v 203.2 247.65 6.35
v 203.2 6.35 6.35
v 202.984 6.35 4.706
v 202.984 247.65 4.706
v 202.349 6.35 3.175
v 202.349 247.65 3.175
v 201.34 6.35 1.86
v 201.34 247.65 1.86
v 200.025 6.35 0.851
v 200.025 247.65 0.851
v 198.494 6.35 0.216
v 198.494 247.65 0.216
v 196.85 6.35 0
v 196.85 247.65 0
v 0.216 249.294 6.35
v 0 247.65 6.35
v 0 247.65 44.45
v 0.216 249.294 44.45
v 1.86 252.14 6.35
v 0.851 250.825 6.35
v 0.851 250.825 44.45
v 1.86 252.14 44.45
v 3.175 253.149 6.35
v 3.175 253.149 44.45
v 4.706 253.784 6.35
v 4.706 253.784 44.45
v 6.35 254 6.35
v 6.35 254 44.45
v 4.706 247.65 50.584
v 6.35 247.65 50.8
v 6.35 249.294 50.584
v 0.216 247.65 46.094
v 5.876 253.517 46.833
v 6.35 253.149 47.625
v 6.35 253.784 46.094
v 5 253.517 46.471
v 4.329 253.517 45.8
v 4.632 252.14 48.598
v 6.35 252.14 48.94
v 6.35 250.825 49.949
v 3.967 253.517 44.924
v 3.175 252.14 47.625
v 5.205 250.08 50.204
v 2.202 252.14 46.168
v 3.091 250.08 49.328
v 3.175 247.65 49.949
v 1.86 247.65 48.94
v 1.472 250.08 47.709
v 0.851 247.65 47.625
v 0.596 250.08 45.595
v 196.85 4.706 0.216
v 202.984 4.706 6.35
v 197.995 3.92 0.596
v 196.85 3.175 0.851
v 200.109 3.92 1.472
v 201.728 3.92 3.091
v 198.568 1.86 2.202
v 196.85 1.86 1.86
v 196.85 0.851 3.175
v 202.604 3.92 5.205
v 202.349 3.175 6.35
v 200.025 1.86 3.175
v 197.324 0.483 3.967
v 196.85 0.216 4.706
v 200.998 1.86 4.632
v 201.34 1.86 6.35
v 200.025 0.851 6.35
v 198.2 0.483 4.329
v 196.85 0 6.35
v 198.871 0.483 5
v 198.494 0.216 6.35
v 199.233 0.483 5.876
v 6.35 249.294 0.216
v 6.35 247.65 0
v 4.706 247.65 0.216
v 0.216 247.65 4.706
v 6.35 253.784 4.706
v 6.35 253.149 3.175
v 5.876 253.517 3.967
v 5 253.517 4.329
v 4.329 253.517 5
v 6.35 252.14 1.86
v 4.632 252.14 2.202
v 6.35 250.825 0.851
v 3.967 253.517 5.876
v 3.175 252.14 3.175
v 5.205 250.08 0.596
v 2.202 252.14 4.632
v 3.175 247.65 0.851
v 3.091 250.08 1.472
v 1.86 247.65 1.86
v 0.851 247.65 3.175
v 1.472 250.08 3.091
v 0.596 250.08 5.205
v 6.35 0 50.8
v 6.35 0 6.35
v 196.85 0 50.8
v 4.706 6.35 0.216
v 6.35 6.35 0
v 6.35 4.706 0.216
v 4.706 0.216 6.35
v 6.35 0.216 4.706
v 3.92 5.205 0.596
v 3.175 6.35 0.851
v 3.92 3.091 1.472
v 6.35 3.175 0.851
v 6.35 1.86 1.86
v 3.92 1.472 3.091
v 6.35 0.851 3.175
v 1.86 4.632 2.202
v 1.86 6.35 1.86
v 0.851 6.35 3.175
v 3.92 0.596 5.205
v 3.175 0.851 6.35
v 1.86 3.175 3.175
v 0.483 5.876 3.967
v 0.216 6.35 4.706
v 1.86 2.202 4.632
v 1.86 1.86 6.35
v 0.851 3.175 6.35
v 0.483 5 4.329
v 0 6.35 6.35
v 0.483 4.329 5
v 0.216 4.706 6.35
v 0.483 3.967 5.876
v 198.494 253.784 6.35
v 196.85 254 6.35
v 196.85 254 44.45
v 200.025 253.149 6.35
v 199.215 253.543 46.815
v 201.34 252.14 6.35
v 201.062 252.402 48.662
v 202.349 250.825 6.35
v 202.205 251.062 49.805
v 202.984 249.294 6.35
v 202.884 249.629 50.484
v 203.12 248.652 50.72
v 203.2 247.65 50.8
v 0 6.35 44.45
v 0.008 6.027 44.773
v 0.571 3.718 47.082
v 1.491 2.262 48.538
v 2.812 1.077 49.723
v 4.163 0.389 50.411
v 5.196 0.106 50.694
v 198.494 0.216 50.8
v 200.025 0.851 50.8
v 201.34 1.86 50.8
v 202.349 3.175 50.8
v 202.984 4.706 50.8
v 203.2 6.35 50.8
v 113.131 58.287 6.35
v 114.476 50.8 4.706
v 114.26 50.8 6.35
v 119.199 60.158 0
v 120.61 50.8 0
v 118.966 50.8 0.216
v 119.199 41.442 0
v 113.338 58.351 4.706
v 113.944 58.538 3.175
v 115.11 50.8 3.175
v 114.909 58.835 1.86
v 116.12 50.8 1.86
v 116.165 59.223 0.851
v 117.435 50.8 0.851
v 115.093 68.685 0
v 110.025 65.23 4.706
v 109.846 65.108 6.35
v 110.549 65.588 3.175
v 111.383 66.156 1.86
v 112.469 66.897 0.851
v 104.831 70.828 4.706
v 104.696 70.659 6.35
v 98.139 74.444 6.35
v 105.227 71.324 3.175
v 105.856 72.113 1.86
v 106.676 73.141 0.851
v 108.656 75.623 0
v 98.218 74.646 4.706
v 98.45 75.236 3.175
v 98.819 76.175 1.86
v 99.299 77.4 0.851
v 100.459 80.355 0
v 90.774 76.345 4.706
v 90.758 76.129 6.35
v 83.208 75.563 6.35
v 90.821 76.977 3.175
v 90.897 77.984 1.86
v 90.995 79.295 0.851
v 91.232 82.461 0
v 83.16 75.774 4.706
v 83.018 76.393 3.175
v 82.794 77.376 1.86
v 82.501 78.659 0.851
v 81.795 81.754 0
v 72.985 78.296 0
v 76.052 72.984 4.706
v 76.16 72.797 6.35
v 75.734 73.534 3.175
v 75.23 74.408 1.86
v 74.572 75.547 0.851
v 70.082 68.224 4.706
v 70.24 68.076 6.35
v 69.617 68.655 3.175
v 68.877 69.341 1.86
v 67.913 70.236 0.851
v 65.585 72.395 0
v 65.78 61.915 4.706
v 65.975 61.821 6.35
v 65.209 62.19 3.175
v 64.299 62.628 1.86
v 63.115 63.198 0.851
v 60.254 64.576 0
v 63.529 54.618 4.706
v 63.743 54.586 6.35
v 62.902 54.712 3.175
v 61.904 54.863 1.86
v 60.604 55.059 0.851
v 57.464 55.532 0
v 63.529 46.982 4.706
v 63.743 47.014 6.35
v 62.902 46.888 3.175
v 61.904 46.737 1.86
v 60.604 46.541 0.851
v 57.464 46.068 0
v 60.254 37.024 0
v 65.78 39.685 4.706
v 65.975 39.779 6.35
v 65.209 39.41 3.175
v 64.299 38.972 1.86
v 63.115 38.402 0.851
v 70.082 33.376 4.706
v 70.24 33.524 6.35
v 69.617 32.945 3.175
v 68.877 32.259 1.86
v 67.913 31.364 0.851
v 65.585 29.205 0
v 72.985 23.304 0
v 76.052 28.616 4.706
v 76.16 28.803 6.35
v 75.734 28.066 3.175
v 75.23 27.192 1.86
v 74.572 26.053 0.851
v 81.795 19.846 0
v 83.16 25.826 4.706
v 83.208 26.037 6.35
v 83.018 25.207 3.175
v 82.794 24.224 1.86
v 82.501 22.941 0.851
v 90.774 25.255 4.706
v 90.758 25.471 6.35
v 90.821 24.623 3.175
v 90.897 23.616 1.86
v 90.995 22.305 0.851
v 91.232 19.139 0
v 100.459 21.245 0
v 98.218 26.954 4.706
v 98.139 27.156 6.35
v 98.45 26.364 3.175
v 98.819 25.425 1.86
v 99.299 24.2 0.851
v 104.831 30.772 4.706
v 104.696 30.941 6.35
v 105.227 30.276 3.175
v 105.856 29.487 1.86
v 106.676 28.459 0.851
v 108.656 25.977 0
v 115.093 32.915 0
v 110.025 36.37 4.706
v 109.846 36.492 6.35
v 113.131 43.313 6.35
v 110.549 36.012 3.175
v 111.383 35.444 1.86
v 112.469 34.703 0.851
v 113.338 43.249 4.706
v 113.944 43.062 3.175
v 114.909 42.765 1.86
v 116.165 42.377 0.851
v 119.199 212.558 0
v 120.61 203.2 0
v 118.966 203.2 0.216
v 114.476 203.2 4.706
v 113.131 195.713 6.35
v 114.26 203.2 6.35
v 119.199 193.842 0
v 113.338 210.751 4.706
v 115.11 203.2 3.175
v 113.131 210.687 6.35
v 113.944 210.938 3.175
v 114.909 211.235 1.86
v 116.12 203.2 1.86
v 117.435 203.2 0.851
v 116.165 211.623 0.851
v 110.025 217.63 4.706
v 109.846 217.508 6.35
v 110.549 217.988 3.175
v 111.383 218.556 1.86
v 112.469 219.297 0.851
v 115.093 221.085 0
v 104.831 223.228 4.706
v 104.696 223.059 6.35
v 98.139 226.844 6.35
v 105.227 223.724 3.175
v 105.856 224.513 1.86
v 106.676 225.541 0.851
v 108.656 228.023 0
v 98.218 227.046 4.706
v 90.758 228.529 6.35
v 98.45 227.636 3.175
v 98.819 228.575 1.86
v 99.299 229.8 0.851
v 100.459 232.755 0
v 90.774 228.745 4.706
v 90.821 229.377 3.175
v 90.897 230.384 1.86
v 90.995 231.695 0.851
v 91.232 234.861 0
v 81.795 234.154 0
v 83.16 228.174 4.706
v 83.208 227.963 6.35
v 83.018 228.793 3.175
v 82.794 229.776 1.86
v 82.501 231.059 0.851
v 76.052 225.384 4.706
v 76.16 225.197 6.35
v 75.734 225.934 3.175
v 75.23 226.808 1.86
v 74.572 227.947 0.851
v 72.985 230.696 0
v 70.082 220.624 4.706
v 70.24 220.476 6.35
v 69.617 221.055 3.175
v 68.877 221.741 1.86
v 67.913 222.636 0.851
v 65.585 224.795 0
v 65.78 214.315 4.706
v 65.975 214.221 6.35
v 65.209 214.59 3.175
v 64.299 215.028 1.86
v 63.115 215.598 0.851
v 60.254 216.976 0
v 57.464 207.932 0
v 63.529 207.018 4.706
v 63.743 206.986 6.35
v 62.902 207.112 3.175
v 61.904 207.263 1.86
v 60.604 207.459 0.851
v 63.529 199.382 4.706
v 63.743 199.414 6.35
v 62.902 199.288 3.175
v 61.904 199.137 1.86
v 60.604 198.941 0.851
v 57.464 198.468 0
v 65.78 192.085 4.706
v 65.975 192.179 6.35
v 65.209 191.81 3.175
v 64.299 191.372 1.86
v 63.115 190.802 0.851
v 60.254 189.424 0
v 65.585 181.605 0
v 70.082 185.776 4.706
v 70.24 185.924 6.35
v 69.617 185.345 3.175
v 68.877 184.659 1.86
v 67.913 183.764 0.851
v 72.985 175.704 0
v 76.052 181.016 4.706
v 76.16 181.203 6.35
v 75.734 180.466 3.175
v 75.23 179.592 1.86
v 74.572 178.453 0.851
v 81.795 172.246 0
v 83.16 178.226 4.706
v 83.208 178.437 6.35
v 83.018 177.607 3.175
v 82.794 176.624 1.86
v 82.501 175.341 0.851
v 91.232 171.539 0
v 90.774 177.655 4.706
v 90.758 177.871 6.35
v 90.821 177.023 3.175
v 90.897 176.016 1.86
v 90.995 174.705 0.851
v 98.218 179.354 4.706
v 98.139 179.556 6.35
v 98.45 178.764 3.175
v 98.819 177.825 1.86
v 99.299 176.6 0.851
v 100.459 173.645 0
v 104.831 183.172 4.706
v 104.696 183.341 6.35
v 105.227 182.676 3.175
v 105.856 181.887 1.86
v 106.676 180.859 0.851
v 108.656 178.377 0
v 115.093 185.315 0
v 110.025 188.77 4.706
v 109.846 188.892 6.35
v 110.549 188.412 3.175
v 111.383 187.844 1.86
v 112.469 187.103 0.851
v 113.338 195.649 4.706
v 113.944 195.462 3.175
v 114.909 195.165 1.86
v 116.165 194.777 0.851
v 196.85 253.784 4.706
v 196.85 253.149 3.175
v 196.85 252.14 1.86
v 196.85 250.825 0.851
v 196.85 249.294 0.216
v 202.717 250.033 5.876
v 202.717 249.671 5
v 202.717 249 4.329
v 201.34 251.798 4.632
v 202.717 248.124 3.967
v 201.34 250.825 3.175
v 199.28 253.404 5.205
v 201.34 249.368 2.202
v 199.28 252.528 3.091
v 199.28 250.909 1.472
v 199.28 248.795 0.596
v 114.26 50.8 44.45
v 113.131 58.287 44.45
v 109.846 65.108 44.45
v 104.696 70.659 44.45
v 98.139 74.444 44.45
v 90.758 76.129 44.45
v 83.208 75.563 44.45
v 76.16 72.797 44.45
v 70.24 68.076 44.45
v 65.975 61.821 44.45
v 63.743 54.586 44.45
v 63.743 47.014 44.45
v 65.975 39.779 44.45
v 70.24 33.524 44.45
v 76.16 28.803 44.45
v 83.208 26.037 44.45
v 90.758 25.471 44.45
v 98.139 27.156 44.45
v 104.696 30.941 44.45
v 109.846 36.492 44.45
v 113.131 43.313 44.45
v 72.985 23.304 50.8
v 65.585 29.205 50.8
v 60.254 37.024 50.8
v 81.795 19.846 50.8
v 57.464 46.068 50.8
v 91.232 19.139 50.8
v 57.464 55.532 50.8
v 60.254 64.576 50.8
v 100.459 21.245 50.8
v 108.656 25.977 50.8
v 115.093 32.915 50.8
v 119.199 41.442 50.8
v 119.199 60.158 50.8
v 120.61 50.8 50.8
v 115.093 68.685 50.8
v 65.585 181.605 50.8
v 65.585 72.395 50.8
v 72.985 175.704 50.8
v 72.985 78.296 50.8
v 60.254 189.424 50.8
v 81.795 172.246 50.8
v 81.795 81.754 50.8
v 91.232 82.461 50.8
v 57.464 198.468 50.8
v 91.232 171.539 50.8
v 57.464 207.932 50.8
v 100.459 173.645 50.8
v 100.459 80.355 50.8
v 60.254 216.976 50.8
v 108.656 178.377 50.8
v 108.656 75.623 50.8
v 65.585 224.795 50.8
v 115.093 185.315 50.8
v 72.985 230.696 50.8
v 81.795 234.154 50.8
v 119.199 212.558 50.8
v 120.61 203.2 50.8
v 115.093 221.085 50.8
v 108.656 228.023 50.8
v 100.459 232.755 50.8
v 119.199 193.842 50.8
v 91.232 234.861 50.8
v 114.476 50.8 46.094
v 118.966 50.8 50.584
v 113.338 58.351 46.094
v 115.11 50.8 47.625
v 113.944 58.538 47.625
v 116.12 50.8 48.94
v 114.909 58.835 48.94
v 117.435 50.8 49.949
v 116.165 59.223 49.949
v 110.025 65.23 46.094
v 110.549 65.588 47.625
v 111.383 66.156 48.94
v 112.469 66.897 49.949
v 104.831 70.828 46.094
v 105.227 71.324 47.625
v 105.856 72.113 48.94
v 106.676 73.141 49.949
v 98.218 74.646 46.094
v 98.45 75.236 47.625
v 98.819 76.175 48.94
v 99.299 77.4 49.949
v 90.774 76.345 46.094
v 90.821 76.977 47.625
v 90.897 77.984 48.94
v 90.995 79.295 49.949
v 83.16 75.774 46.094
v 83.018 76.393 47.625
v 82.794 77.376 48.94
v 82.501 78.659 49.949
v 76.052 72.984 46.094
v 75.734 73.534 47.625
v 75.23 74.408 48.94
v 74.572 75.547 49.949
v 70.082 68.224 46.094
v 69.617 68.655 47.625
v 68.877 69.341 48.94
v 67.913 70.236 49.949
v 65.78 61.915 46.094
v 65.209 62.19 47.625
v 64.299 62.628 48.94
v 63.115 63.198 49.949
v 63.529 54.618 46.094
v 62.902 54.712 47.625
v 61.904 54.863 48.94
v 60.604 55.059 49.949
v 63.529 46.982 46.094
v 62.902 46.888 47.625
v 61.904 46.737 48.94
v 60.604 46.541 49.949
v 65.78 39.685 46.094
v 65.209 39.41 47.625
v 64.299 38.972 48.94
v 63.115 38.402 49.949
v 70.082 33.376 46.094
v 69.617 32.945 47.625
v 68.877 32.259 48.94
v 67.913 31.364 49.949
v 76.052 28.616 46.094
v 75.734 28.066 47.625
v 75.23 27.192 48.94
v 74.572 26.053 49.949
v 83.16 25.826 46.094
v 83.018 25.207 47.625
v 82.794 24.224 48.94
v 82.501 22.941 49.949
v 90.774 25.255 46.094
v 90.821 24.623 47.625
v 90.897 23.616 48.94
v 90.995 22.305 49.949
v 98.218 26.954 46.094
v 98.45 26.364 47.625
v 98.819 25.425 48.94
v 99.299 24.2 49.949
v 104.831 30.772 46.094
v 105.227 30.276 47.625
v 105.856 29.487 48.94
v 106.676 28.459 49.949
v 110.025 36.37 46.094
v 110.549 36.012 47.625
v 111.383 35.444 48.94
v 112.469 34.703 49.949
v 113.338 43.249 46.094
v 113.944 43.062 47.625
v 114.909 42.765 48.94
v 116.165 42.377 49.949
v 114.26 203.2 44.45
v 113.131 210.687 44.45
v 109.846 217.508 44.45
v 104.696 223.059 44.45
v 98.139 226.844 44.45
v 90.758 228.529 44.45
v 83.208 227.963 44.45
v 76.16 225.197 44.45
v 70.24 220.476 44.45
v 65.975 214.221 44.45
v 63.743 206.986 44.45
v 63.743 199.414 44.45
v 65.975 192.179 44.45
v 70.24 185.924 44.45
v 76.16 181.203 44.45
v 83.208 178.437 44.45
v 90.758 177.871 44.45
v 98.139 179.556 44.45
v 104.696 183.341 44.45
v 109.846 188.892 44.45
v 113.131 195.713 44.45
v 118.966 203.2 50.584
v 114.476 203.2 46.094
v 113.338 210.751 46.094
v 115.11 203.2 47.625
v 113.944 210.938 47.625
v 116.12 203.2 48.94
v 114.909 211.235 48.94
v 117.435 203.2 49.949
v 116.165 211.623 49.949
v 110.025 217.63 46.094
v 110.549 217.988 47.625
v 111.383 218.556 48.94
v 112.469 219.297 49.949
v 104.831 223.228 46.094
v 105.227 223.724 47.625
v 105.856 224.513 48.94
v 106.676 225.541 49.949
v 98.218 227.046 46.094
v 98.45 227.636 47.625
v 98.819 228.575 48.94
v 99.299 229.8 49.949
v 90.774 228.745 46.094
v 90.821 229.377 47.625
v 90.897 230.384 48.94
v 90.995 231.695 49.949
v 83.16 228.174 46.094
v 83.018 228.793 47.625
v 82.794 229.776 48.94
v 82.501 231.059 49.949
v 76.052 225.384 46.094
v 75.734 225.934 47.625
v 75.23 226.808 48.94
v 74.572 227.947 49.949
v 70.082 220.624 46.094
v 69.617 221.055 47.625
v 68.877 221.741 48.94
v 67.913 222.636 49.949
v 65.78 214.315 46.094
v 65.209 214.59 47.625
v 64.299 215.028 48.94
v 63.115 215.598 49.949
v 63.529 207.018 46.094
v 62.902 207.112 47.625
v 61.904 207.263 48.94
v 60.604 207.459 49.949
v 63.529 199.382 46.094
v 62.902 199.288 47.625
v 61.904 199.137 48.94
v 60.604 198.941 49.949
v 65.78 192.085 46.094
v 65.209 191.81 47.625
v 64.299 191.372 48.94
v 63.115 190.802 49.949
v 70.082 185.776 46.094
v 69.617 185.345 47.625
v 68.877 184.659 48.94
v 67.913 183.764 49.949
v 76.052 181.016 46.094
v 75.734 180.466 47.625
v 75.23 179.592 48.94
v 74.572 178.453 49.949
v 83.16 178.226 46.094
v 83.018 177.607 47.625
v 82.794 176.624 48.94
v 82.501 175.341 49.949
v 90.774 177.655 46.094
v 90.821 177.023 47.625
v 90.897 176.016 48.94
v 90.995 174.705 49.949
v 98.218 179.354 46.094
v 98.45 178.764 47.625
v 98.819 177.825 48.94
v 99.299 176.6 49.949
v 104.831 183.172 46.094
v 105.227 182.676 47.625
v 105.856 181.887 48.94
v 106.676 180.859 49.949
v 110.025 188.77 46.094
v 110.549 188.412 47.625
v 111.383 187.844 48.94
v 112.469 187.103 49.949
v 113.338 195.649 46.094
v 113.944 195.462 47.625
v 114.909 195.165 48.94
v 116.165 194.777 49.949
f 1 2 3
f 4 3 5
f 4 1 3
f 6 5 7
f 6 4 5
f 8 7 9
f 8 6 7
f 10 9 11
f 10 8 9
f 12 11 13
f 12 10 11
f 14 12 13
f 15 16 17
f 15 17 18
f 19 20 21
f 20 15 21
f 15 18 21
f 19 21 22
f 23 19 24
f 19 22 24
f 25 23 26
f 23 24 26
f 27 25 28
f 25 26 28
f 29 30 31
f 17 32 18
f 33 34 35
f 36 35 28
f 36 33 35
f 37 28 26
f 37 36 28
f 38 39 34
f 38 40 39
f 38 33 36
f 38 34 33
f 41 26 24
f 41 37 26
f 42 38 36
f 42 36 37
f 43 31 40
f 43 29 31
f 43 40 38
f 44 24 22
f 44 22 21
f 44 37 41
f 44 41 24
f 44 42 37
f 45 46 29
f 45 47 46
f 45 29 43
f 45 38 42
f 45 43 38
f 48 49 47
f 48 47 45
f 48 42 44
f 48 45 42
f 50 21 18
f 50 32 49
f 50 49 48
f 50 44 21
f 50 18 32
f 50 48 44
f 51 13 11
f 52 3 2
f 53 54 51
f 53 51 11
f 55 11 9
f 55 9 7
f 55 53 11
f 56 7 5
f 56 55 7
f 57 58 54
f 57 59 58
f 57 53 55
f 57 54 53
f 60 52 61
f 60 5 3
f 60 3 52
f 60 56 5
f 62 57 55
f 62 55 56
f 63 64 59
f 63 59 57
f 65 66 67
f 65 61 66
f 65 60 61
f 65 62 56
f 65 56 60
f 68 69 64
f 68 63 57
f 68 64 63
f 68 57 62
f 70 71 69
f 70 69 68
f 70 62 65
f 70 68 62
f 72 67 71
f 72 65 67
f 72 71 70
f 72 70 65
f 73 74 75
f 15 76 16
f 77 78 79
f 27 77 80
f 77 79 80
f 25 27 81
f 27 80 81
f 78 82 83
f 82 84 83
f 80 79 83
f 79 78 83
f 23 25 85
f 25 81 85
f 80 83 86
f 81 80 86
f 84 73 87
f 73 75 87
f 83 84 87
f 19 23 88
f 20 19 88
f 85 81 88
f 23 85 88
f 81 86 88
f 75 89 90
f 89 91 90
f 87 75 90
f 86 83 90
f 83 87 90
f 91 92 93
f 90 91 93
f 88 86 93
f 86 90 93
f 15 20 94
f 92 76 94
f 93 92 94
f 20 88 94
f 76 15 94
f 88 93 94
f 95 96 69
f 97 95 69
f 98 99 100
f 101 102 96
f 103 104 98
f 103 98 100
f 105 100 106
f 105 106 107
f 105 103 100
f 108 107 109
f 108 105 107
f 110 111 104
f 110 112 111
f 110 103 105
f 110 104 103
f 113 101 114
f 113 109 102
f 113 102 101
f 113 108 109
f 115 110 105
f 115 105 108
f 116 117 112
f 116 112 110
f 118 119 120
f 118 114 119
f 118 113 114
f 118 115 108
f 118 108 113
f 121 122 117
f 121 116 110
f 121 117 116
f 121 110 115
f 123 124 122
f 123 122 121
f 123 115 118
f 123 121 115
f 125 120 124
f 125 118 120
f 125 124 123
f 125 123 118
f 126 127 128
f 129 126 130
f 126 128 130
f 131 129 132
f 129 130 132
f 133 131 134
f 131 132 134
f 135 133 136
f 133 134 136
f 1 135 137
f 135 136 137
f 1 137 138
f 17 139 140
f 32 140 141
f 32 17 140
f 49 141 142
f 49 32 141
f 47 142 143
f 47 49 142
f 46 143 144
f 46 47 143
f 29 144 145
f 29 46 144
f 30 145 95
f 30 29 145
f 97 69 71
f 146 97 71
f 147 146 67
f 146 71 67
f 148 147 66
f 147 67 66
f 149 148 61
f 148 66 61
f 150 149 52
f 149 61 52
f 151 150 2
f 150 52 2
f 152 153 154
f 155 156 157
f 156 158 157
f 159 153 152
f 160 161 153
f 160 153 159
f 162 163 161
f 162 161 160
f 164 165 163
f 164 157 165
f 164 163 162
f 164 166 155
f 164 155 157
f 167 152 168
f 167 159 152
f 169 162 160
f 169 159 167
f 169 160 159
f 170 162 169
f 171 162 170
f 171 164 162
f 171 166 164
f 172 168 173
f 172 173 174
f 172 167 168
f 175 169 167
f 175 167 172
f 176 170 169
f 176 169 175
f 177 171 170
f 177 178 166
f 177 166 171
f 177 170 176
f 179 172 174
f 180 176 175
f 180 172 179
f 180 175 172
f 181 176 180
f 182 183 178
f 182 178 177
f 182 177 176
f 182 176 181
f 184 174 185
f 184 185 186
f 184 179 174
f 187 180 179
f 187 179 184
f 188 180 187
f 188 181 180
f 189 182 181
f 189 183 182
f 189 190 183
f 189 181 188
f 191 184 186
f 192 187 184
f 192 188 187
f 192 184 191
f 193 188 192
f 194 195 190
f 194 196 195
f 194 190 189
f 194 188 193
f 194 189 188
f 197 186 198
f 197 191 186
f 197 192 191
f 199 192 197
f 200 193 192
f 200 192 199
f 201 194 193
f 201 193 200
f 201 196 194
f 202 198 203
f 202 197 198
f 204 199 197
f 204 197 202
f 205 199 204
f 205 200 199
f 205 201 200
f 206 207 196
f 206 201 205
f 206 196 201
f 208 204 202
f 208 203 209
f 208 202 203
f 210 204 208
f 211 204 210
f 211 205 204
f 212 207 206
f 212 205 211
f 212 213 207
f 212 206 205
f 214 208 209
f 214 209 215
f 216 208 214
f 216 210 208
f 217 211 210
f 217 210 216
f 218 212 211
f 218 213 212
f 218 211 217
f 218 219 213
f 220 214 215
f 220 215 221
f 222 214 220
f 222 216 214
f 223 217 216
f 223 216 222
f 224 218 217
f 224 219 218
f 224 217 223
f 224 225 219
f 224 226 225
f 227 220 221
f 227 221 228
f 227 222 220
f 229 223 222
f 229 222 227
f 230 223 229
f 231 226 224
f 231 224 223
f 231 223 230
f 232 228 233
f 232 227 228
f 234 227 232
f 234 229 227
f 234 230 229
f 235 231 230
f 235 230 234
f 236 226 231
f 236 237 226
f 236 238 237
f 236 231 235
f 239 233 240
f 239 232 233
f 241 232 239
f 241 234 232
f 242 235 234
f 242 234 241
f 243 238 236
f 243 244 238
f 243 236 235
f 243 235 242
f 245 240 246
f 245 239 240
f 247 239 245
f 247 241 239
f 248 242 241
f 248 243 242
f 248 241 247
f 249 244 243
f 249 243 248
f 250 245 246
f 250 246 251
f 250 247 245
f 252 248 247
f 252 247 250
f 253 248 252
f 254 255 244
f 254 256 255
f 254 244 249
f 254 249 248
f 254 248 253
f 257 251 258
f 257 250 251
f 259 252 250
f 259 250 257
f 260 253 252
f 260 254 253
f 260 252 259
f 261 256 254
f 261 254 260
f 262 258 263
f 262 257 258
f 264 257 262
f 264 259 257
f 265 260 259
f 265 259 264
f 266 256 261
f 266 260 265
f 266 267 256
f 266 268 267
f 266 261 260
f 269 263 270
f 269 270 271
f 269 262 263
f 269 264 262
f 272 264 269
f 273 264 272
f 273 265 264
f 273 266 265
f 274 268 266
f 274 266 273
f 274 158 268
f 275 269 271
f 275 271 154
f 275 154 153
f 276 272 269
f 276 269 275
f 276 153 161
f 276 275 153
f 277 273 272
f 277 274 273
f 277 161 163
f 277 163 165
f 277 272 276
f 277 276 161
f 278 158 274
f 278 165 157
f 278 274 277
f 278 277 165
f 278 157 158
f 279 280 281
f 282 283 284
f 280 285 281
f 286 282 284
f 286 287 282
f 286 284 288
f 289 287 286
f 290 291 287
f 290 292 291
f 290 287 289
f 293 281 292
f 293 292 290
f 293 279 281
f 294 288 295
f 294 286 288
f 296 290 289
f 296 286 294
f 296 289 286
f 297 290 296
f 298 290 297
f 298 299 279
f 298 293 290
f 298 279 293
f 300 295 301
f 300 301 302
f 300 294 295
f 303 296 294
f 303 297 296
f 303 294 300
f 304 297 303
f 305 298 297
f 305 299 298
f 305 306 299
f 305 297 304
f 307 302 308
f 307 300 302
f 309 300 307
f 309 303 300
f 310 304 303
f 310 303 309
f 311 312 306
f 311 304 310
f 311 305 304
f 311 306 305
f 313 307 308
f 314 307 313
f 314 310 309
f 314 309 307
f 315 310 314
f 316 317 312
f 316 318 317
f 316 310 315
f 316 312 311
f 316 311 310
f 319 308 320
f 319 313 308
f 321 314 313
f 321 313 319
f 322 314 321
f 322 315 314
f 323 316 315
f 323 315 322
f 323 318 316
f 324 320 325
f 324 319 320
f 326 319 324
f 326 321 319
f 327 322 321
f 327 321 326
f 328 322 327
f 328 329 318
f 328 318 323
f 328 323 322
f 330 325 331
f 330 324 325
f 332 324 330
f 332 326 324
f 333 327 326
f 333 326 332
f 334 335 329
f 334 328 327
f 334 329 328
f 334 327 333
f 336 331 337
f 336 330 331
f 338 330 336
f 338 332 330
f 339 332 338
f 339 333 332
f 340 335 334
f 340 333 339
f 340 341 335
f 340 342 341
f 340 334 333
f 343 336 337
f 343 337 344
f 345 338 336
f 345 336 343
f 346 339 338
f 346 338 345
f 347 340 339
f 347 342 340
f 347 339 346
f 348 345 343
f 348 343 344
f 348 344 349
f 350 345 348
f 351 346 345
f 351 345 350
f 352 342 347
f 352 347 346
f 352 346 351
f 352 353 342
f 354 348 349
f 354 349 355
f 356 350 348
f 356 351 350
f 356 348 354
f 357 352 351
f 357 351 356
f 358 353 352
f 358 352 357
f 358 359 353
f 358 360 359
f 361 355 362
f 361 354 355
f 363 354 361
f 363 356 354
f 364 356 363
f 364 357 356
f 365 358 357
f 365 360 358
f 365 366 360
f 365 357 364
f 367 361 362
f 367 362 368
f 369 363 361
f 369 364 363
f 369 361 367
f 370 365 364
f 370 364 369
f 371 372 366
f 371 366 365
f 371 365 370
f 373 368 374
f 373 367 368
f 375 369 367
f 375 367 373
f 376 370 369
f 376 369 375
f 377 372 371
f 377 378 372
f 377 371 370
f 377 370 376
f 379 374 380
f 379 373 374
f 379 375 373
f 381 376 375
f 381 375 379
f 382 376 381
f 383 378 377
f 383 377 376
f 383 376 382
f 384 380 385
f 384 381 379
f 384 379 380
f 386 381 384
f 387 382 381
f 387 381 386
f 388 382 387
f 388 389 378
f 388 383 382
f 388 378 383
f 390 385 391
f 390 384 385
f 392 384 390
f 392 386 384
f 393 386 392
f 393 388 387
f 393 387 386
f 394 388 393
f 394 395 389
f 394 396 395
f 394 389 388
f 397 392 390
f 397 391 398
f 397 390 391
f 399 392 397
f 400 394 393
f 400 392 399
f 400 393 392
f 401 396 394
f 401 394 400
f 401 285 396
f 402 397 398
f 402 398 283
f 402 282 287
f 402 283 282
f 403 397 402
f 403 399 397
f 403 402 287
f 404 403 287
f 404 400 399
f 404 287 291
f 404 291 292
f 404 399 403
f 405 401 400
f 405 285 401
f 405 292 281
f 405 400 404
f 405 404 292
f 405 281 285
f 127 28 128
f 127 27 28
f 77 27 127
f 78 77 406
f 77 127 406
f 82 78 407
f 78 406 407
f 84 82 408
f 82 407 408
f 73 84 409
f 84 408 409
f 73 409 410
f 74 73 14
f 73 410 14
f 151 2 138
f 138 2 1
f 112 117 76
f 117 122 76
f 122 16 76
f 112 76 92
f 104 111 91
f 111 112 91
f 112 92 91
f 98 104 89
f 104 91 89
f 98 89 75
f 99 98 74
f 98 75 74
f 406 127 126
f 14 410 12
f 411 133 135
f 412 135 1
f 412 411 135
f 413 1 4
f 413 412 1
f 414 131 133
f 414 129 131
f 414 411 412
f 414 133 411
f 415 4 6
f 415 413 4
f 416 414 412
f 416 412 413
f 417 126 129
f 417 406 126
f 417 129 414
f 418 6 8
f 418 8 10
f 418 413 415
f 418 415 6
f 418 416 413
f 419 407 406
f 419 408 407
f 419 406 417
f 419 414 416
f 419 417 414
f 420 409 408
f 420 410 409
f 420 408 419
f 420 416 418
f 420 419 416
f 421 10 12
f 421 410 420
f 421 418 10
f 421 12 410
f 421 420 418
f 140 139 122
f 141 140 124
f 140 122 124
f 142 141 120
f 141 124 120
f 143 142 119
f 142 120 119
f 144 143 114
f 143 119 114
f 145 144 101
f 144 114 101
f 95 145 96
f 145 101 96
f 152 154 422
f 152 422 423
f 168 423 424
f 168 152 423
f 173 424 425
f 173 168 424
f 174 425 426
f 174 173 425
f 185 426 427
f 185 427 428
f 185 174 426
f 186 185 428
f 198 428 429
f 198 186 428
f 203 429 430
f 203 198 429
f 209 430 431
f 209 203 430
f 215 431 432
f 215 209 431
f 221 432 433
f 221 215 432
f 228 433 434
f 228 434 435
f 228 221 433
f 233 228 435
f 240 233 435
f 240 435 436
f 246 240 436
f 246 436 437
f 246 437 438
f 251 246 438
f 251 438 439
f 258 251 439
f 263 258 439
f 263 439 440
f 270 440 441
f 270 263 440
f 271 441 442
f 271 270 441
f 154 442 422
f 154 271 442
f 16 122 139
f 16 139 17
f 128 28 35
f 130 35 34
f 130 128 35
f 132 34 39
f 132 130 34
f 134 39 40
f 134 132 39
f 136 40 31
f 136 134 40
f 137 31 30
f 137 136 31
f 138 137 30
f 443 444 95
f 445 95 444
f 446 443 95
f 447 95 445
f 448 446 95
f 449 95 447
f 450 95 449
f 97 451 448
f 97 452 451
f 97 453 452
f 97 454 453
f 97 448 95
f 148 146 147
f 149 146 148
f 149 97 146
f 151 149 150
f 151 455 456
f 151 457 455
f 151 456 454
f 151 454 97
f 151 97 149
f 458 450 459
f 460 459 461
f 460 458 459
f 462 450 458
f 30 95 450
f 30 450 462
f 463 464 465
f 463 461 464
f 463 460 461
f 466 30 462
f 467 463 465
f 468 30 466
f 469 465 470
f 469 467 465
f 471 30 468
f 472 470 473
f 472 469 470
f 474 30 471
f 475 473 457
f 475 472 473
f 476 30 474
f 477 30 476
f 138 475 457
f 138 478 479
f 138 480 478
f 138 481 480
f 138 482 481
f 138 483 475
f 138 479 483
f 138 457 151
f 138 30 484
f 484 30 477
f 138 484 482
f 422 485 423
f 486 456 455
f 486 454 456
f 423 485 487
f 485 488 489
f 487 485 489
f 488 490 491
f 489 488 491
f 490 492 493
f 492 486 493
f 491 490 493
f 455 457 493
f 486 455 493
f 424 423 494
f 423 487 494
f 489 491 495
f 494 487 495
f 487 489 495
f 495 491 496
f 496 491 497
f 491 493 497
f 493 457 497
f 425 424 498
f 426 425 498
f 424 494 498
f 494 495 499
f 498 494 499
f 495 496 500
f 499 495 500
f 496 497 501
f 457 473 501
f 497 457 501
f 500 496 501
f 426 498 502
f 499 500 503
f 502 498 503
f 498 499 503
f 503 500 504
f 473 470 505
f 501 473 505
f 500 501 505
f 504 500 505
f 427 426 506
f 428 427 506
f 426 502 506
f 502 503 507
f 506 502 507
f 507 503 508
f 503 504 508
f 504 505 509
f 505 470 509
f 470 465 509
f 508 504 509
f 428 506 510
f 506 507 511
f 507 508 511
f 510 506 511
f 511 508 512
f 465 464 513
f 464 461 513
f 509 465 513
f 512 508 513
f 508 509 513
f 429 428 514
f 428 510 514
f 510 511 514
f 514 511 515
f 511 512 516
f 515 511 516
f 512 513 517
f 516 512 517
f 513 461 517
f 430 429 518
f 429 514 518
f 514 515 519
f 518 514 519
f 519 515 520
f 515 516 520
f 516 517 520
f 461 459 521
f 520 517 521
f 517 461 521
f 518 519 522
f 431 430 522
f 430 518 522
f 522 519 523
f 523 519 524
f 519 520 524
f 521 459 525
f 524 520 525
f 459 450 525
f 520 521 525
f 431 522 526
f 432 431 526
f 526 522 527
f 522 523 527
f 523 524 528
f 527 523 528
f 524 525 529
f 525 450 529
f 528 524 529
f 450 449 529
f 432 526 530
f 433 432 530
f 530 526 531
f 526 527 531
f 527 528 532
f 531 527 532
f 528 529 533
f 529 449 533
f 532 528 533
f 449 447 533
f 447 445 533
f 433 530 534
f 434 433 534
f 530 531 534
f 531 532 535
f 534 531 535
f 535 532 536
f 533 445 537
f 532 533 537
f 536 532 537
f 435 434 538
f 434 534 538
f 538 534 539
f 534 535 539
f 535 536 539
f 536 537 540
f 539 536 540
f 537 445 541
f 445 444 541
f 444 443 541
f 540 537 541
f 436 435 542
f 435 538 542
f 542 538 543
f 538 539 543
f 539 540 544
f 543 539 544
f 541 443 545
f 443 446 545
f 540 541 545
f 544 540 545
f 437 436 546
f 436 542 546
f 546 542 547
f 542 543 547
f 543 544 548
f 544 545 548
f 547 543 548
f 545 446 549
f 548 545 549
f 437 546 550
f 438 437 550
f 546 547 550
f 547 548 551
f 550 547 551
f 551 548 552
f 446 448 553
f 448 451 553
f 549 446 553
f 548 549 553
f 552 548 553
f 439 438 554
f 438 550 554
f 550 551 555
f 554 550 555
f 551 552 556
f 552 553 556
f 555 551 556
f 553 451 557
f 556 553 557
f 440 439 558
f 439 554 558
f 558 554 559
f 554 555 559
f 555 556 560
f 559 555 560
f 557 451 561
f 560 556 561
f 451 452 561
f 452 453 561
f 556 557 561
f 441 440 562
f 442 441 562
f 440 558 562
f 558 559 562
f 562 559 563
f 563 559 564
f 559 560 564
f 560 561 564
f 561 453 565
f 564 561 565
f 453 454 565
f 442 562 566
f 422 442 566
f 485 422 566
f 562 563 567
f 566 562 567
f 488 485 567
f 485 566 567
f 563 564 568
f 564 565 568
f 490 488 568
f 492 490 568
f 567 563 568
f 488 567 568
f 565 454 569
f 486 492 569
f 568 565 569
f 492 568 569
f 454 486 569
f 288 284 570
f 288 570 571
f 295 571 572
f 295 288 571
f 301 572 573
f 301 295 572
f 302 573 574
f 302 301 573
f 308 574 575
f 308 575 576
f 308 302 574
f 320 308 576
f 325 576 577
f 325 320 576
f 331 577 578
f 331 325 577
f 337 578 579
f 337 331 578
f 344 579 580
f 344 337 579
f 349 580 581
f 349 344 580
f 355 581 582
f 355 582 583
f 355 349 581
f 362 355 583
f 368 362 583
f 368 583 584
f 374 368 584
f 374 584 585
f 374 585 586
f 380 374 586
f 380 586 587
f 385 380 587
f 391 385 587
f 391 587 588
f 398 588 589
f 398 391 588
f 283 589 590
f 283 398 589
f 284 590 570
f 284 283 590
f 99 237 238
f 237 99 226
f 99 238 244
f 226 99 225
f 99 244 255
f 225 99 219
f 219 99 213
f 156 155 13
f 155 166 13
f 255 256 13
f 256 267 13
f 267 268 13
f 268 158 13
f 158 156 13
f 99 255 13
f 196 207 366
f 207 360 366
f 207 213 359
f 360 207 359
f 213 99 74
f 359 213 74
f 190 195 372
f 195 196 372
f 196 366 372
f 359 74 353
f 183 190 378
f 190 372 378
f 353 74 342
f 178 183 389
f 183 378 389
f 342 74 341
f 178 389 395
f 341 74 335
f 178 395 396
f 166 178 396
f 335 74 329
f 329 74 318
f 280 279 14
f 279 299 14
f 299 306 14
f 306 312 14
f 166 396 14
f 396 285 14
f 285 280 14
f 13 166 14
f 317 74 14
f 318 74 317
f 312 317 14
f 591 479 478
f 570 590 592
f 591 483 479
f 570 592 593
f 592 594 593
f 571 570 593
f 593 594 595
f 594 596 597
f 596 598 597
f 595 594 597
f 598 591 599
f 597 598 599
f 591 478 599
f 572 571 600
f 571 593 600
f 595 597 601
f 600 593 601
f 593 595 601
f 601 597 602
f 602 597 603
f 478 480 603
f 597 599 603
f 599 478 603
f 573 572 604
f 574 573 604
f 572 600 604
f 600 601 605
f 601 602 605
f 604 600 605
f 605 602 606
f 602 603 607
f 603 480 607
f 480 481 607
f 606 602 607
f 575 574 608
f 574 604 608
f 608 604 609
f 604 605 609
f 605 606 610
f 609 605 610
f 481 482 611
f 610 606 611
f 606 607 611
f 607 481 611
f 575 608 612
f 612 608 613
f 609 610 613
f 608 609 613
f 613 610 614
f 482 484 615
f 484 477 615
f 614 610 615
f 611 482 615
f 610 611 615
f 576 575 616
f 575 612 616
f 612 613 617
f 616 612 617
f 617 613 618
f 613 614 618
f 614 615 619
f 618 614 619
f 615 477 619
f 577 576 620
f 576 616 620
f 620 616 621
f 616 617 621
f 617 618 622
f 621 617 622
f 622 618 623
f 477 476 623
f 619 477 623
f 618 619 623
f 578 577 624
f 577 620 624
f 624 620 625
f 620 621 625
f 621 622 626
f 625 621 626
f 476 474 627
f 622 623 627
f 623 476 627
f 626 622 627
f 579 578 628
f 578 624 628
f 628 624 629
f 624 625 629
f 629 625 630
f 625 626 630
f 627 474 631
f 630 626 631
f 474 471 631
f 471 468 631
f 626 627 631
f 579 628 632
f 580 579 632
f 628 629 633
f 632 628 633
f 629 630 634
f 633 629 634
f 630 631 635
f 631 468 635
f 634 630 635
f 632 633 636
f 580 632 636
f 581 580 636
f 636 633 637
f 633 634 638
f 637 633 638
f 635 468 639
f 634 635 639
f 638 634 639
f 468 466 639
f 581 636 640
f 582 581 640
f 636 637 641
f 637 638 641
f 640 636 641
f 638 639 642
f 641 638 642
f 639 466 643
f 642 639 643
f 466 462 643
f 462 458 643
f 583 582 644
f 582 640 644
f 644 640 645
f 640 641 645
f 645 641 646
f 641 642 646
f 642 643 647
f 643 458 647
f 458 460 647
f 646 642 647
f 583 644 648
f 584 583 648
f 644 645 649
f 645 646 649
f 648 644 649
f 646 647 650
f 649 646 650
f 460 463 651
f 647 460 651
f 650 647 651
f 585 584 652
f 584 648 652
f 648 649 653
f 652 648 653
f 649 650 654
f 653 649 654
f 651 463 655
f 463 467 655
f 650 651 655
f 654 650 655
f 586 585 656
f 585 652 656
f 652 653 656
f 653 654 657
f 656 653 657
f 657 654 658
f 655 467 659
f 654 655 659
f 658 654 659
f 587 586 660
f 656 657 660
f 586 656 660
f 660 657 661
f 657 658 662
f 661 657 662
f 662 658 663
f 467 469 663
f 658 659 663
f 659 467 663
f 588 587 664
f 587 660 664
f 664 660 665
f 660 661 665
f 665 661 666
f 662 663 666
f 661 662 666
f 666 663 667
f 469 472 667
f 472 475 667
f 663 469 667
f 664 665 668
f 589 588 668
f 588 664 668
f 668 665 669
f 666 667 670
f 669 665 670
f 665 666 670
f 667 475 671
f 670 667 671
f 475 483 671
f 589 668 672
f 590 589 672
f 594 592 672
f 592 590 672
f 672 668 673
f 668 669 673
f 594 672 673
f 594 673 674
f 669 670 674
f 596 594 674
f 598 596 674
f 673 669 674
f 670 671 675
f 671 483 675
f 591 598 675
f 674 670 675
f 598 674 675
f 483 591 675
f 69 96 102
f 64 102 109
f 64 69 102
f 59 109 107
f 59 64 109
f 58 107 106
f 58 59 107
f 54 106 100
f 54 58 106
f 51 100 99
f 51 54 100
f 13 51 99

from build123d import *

# Parameters (mm, degrees)
F0_W         = 203.2
F0_H         = 254
F0_R         = 25.4
F1_DEPTH     = 50.8
F2_R         = 6.35
F3_T1_DEPTH  = 53.975
F3_T3_DEPTH  = 60.325
F3_S7_W      = 6.477
F3_S7_H      = 6.477
F3_T8_DEPTH  = 6.477
F3_S13_W     = 6.477
F3_S13_H     = 6.477
F3_T14_DEPTH = 6.477


# Not quite as in the source:
# - a fillet or chamfer that OpenCascade refuses, or shapes differently, is made with other operations: its cross-section is extruded or revolved along the edge and cut away or added


with BuildPart() as f1:
    # F0 (on Top) → F1 (new body)
    with BuildSketch(Plane.XY):
        with Locations((101.6, 127)):
            Rectangle(F0_W, F0_H)
        with Locations((88.8597142273, 50.8)):
            Circle(F0_R, mode=Mode.SUBTRACT)
        with Locations((88.8597142273, 203.2)):
            Circle(F0_R, mode=Mode.SUBTRACT)
    extrude(amount=F1_DEPTH)

    # F2
    f2_edges = [f1.edges().sort_by_distance(p)[0] for p in [
        (0, 127, 0),
        (0, 127, 50.8),
        (101.6, 254, 50.8),
        (63.459714, 203.2, 50.8),
        (63.459714, 50.8, 50.8),
        (101.6, 254, 0),
        (0, 254, 25.4),
        (203.2, 254, 25.4),
        (63.459714, 203.2, 0),
        (63.459714, 50.8, 0),
        (101.6, 0, 0),
        (203.2, 127, 0),
    ]]
    fillet(f2_edges, radius=F2_R)

    # F3: fillet of radius 6.35 on 6 edges, made by hand

    # F3_s2 → F3_t1 (cut)
    with BuildSketch(Plane.XY.offset(6.35)):
        with BuildLine():
            ThreePointArc((0, 6.35), (1.8598719395, 1.8598719395), (6.35, 0))
            Line((6.35, 0), (0, 0))
            Line((0, 0), (0, 6.35))
        make_face()
    extrude(amount=F3_T1_DEPTH, mode=Mode.SUBTRACT)

    # F3_s4 → F3_t3 (cut)
    with BuildSketch(Plane.XY.offset(6.35)):
        with BuildLine():
            ThreePointArc((196.85, 0), (201.3401280605, 1.8598719395), (203.2, 6.35))
            Line((203.2, 6.35), (203.2, 0))
            Line((203.2, 0), (196.85, 0))
        make_face()
    extrude(amount=F3_T3_DEPTH, mode=Mode.SUBTRACT)


with BuildPart() as f3_tool6:
    # F3_s7 → F3_t8 (new body)
    with BuildSketch(Plane.YZ.offset(6.35)):
        with Locations((3.1115, 3.1115)):
            Rectangle(F3_S7_W, F3_S7_H)
    extrude(amount=-F3_T8_DEPTH)

    # F3_s9 → F3_t10 (revolve, cut)
    with BuildSketch(Plane(origin=(6.35, 6.35, 6.35), x_dir=(0, 0.7071067812, 0.7071067812), z_dir=(0, -0.7071067812, 0.7071067812))):
        with BuildLine():
            ThreePointArc((0, -6.35), (6.35, 0), (0, 6.35))
            Line((0, 6.35), (0, -6.35))
        make_face()
    revolve(axis=Axis((6.35, 6.35, 6.35), (-1, 0, 0)), mode=Mode.SUBTRACT)


with BuildPart() as f1_1:
    add(f1.part)

    # F3_t5: cut F3_tool6
    add(f3_tool6.part, mode=Mode.SUBTRACT)


with BuildPart() as f3_tool12:
    # F3_s13 → F3_t14 (new body)
    with BuildSketch(Plane.XZ.offset(-6.35)):
        with Locations((200.0885, 3.1115)):
            Rectangle(F3_S13_W, F3_S13_H)
    extrude(amount=F3_T14_DEPTH)

    # F3_s15 → F3_t16 (revolve, cut)
    with BuildSketch(Plane(origin=(196.85, 6.35, 6.35), x_dir=(-0.7071067812, 0, 0.7071067812), z_dir=(0.7071067812, 0, 0.7071067812))):
        with BuildLine():
            ThreePointArc((0, -6.35), (6.35, 0), (0, 6.35))
            Line((0, 6.35), (0, -6.35))
        make_face()
    revolve(axis=Axis((196.85, 6.35, 6.35), (0, -1, 0)), mode=Mode.SUBTRACT)


with BuildPart() as f1_2:
    add(f1_1.part)

    # F3_t11: cut F3_tool12
    add(f3_tool12.part, mode=Mode.SUBTRACT)


solid = f1_2.part
